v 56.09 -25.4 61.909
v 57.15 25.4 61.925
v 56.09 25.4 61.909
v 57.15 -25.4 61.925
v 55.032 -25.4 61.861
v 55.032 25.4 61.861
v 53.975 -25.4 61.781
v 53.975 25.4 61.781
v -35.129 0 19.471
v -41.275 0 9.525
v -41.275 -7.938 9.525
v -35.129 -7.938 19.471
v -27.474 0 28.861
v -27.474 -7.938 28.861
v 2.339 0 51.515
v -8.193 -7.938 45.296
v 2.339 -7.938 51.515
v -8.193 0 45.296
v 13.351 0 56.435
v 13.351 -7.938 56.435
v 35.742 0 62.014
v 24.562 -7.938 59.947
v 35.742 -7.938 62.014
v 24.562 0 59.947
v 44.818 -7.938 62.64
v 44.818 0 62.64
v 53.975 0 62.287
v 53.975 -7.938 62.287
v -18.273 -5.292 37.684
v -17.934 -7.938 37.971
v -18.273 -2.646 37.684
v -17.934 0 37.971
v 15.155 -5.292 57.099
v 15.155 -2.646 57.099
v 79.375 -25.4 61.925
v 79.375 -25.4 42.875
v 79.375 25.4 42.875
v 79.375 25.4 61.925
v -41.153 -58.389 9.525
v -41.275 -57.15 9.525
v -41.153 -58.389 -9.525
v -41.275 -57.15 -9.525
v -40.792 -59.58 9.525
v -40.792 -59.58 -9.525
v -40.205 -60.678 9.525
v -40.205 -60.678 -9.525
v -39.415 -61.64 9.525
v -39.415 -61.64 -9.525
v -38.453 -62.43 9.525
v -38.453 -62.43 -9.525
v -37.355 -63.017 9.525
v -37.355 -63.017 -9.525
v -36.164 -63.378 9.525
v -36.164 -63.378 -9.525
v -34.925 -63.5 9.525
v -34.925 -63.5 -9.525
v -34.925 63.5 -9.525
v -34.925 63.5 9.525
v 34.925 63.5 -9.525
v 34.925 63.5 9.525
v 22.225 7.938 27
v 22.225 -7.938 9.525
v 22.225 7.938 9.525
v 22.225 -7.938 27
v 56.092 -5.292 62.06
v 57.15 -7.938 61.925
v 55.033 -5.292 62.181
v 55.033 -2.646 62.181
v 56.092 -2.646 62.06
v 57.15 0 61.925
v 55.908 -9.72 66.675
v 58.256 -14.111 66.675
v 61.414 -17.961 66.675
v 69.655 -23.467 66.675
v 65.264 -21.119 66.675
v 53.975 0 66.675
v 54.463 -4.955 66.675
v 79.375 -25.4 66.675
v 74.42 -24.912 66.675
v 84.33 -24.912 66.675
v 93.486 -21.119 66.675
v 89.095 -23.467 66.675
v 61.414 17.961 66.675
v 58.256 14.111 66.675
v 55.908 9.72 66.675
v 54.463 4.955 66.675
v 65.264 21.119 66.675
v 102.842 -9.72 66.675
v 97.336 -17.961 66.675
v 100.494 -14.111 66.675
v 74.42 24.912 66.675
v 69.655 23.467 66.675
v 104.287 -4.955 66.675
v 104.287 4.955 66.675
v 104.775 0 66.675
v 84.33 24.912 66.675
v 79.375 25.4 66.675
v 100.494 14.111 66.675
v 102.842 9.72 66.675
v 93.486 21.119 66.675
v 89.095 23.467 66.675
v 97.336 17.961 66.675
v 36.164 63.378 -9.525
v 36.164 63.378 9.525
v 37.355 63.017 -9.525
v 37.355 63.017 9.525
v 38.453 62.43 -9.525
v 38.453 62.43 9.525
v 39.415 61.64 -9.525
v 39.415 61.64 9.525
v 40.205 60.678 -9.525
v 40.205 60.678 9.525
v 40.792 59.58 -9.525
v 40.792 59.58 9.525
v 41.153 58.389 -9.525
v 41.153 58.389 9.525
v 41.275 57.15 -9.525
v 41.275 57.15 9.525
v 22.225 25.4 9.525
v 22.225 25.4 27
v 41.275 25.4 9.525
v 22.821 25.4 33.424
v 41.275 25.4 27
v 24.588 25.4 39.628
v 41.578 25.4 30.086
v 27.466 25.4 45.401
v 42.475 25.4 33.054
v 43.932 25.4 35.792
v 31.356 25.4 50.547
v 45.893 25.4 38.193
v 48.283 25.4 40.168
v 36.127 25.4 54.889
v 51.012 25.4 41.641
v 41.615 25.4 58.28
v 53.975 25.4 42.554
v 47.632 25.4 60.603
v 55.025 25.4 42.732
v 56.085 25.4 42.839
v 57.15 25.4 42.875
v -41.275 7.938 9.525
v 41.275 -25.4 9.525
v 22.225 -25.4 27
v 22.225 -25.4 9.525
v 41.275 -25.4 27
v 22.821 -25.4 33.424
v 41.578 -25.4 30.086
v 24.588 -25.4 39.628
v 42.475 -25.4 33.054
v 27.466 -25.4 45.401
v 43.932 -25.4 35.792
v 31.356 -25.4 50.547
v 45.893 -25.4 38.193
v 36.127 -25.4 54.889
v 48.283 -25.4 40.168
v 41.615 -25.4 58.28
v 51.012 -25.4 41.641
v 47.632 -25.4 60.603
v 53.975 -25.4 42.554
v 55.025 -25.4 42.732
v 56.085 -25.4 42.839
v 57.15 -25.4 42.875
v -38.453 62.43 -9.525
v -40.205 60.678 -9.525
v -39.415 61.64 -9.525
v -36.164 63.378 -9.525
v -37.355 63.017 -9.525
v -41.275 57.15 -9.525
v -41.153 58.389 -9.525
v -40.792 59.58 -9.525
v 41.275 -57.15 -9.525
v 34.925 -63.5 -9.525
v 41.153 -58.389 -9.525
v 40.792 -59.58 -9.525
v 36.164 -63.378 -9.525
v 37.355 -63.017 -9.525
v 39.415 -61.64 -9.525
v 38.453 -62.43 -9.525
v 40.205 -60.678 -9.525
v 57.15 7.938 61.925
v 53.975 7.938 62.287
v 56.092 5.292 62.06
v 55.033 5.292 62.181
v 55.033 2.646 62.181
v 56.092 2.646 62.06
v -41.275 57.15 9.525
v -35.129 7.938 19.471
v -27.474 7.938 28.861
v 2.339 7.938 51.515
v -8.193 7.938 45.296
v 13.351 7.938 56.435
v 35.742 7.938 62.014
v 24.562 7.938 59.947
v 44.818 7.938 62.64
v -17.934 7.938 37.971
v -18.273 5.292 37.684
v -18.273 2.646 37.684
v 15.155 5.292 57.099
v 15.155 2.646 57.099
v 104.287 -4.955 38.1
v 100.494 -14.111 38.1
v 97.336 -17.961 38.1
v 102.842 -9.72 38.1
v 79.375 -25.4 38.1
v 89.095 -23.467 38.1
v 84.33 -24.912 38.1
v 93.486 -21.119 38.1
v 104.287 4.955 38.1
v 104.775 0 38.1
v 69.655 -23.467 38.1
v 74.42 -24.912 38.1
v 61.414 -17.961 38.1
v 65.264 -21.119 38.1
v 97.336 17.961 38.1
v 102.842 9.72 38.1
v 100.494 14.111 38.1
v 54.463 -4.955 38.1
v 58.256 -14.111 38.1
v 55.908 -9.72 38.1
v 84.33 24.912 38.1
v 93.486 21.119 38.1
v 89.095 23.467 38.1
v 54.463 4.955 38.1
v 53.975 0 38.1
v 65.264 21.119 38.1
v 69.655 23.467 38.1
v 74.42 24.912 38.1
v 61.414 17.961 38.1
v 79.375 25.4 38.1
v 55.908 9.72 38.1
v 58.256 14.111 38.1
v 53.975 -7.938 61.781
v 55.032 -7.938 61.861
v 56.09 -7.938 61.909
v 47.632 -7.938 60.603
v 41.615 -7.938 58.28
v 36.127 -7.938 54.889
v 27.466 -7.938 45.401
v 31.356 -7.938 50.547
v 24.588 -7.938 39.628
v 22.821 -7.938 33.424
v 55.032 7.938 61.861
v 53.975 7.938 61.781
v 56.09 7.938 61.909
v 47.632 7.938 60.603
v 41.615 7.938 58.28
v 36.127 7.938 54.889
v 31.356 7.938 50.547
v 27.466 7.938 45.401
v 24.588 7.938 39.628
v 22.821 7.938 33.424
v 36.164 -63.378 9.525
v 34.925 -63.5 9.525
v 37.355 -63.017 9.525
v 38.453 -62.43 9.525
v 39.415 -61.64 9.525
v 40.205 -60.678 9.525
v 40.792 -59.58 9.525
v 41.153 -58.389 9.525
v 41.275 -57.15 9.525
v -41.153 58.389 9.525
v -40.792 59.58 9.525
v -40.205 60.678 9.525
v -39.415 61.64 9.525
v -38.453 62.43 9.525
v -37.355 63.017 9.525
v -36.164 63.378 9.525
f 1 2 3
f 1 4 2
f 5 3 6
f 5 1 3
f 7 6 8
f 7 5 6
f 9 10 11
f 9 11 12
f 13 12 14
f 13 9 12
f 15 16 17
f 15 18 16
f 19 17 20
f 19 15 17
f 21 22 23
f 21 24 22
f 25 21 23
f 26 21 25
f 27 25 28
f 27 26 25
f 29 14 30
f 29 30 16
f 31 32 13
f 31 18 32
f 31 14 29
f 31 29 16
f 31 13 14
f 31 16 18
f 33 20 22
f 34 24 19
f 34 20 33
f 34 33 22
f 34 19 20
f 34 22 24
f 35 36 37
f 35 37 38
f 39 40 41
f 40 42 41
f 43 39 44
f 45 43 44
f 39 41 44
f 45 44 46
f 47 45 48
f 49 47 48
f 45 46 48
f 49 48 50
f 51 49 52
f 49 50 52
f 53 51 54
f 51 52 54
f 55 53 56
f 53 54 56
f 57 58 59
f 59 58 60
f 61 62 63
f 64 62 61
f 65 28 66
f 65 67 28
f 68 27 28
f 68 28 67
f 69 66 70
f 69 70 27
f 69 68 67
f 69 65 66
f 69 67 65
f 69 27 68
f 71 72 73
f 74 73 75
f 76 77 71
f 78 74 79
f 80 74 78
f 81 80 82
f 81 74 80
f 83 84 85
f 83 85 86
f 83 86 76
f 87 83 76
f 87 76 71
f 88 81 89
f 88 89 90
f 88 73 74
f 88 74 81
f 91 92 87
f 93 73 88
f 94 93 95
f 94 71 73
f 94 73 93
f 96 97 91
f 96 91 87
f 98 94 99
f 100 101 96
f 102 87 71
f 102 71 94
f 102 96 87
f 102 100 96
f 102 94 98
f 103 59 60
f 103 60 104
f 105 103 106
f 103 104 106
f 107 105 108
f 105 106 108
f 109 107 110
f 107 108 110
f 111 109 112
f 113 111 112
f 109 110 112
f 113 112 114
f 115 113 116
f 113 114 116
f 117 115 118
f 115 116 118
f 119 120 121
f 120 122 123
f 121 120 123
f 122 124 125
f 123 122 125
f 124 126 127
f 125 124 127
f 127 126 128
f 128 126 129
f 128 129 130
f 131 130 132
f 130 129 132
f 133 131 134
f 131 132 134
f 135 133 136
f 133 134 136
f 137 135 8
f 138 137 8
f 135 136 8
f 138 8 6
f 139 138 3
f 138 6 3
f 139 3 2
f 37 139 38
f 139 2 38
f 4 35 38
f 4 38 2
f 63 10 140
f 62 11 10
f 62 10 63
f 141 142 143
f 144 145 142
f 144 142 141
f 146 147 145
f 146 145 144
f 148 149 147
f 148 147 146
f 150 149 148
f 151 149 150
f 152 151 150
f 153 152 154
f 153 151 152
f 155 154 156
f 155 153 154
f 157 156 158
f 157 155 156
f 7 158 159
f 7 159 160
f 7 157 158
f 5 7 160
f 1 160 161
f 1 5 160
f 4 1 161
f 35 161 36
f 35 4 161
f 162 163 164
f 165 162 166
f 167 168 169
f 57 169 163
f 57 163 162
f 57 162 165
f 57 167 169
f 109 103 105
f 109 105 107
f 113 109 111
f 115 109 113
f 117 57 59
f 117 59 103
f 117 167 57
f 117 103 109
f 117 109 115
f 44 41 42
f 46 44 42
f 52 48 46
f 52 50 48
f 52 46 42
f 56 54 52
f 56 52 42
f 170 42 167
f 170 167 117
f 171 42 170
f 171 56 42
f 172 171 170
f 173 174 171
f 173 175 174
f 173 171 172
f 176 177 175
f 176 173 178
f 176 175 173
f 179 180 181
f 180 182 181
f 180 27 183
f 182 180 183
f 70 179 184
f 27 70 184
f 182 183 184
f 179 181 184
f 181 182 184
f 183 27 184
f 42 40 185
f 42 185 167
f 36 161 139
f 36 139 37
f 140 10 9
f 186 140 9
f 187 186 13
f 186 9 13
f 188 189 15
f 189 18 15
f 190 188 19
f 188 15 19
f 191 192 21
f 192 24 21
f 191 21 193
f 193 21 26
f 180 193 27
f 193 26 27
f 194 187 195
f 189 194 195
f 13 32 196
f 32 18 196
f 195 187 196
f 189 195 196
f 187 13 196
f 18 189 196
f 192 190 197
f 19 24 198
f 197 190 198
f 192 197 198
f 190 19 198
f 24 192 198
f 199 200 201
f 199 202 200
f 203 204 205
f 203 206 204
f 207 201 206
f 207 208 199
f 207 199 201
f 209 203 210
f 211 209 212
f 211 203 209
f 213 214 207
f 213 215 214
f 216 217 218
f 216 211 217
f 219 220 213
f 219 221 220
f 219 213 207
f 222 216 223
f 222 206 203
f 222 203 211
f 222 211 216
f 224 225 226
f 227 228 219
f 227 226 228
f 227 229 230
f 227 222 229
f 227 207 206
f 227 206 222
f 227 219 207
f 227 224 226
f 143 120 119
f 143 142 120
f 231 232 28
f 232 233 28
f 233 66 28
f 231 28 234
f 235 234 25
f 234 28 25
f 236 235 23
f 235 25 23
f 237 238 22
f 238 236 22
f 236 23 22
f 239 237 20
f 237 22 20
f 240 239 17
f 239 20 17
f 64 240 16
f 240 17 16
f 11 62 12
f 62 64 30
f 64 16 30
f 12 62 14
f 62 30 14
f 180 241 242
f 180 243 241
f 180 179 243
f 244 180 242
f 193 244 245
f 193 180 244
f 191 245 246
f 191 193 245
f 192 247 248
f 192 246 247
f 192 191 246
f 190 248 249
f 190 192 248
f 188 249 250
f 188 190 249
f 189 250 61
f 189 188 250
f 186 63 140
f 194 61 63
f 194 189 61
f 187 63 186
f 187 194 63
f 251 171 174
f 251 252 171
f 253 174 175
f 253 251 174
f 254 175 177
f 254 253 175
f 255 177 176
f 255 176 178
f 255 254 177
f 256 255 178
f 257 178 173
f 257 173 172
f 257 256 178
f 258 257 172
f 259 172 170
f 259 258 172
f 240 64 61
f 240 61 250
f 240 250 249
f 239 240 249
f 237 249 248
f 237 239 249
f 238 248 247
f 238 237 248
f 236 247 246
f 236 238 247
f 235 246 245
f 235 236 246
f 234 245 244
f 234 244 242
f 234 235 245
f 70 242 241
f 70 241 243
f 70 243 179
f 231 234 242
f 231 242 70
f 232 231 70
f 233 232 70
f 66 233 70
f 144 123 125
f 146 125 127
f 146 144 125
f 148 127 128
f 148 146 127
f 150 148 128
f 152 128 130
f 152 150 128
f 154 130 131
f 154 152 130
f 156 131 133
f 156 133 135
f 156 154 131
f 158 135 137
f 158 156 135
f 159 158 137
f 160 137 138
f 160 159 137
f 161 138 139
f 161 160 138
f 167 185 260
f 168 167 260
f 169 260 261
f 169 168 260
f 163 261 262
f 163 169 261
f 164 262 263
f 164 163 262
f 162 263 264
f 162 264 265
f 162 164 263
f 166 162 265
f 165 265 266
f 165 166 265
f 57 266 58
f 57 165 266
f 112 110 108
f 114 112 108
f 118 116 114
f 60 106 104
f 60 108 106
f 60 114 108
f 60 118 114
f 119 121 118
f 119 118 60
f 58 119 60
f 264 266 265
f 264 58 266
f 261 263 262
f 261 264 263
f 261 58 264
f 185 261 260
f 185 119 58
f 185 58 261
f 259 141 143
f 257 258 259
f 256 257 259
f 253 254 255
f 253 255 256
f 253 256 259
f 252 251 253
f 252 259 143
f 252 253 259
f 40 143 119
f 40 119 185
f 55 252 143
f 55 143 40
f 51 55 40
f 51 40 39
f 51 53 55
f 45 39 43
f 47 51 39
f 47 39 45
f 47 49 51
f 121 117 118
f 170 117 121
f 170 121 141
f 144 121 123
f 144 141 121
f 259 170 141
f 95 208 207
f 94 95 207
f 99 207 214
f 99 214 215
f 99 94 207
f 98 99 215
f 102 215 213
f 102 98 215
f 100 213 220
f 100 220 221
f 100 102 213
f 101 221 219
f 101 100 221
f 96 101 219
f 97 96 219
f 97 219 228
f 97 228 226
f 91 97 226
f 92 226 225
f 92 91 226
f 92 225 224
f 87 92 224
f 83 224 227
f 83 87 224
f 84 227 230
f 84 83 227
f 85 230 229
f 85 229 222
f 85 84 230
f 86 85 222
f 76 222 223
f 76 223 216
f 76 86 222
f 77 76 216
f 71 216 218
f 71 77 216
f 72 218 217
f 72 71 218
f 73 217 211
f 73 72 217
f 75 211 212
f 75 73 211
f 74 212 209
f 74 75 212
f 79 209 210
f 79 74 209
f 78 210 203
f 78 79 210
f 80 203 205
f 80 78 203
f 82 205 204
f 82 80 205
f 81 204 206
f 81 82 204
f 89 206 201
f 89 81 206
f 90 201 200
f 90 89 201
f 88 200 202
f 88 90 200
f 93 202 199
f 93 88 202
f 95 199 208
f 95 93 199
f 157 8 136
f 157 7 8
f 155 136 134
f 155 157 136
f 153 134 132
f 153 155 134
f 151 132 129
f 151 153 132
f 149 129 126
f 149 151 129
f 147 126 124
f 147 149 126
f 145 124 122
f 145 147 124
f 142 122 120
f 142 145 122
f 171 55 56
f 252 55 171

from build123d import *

# Parameters (mm, degrees)
F1_DEPTH = 63.5
F2_DEPTH = 25.4
F3_DEPTH = 7.9375
F5_R     = 6.35


with BuildPart() as f1:
    # F0 (on Front) → F1 (new body, symmetric)
    with BuildSketch(Plane.XZ):
        Polygon((22.225, 9.525), (-41.275, 9.525), (-41.275, -9.525), (41.275, -9.525), (41.275, 9.525), align=None)
    extrude(amount=F1_DEPTH, both=True)

    # F0 (on Front) → F2 (join, symmetric)
    with BuildSketch(Plane.XZ):
        with BuildLine():
            Line((22.225, 27.0002), (22.225, 9.525))
            Line((22.225, 9.525), (41.275, 9.525))
            Line((41.275, 9.525), (41.275, 27.0002))
            ThreePointArc((41.275, 27.0002), (44.8532778758, 37.040431571), (53.975, 42.5544598667))
            Line((53.975, 42.5544598667), (53.975, 61.7805824016))
            ThreePointArc((53.975, 61.7805824016), (31.3561780653, 50.5466301965), (22.225, 27.0002))
        make_face()
        with BuildLine():
            ThreePointArc((57.15, 61.9252), (55.5608540619, 61.8890268675), (53.975, 61.7805824016))
            Line((53.975, 61.7805824016), (53.975, 42.5544598667))
            ThreePointArc((53.975, 42.5544598667), (55.5544202282, 42.794811429), (57.15, 42.8752))
            Line((57.15, 42.8752), (79.375, 42.8752))
            Line((79.375, 42.8752), (79.375, 61.9252))
            Line((79.375, 61.9252), (57.15, 61.9252))
        make_face()
    extrude(amount=F2_DEPTH, both=True)

    # F5
    f5_edges = [f1.edges().sort_by_distance(p)[0] for p in [
        (41.275, -63.5, 0),
        (-41.275, -63.5, 0),
        (41.275, 63.5, 0),
        (-41.275, 63.5, 0),
    ]]
    fillet(f5_edges, radius=F5_R)


with BuildPart() as f3:
    # F0 (on Front) → F3 (new body, symmetric)
    with BuildSketch(Plane.XZ):
        with BuildLine():
            add(Edge.make_bspline(
                [(-41.275, 9.525), (-25.1638375289, 40.227826574), (14.1366621508, 66.0403572169), (53.975, 62.2872734092)],
                knots=[0, 0, 0, 0, 108.6196284342, 108.6196284342, 108.6196284342, 108.6196284342], degree=3))
            Line((-41.275, 9.525), (22.225, 9.525))
            Line((22.225, 9.525), (22.225, 27.0002))
            ThreePointArc((22.225, 27.0002), (31.3561780653, 50.5466301965), (53.975, 61.7805824016))
            Line((53.975, 61.7805824016), (53.975, 62.2872734092))
        make_face()
        with BuildLine():
            add(Edge.make_bspline(
                [(53.975, 62.2872734092), (55.0330953962, 62.187592526), (56.0915701937, 62.0670554931), (57.15, 61.9252)],
                knots=[108.6196284342, 108.6196284342, 108.6196284342, 108.6196284342, 111.5045361635, 111.5045361635, 111.5045361635, 111.5045361635], degree=3))
            Line((53.975, 62.2872734092), (53.975, 61.7805824016))
            ThreePointArc((53.975, 61.7805824016), (55.5608540619, 61.8890268675), (57.15, 61.9252))
        make_face()
        with BuildLine():
            add(Edge.make_bspline(
                [(-41.275, 9.525), (-25.1638375289, 40.227826574), (14.1366621508, 66.0403572169), (53.975, 62.2872734092)],
                knots=[0, 0, 0, 0, 108.6196284342, 108.6196284342, 108.6196284342, 108.6196284342], degree=3))
            Line((-41.275, 9.525), (22.225, 9.525))
            Line((22.225, 9.525), (22.225, 27.0002))
            ThreePointArc((22.225, 27.0002), (31.3561780653, 50.5466301965), (53.975, 61.7805824016))
            Line((53.975, 61.7805824016), (53.975, 62.2872734092))
        make_face()
    extrude(amount=F3_DEPTH, both=True)


with BuildPart() as f4:
    # F0 (on Front) → F4 (revolve)
    with BuildSketch(Plane.XZ):
        Polygon((104.775, 66.675), (79.375, 66.675), (79.375, 61.9252), (79.375, 42.8752), (79.375, 38.1), (104.775, 38.1), align=None)
    revolve(axis=Axis((79.375, 0, 52.3875), (0, 0, 1)))


solid = Compound([f1.part, f3.part, f4.part])
